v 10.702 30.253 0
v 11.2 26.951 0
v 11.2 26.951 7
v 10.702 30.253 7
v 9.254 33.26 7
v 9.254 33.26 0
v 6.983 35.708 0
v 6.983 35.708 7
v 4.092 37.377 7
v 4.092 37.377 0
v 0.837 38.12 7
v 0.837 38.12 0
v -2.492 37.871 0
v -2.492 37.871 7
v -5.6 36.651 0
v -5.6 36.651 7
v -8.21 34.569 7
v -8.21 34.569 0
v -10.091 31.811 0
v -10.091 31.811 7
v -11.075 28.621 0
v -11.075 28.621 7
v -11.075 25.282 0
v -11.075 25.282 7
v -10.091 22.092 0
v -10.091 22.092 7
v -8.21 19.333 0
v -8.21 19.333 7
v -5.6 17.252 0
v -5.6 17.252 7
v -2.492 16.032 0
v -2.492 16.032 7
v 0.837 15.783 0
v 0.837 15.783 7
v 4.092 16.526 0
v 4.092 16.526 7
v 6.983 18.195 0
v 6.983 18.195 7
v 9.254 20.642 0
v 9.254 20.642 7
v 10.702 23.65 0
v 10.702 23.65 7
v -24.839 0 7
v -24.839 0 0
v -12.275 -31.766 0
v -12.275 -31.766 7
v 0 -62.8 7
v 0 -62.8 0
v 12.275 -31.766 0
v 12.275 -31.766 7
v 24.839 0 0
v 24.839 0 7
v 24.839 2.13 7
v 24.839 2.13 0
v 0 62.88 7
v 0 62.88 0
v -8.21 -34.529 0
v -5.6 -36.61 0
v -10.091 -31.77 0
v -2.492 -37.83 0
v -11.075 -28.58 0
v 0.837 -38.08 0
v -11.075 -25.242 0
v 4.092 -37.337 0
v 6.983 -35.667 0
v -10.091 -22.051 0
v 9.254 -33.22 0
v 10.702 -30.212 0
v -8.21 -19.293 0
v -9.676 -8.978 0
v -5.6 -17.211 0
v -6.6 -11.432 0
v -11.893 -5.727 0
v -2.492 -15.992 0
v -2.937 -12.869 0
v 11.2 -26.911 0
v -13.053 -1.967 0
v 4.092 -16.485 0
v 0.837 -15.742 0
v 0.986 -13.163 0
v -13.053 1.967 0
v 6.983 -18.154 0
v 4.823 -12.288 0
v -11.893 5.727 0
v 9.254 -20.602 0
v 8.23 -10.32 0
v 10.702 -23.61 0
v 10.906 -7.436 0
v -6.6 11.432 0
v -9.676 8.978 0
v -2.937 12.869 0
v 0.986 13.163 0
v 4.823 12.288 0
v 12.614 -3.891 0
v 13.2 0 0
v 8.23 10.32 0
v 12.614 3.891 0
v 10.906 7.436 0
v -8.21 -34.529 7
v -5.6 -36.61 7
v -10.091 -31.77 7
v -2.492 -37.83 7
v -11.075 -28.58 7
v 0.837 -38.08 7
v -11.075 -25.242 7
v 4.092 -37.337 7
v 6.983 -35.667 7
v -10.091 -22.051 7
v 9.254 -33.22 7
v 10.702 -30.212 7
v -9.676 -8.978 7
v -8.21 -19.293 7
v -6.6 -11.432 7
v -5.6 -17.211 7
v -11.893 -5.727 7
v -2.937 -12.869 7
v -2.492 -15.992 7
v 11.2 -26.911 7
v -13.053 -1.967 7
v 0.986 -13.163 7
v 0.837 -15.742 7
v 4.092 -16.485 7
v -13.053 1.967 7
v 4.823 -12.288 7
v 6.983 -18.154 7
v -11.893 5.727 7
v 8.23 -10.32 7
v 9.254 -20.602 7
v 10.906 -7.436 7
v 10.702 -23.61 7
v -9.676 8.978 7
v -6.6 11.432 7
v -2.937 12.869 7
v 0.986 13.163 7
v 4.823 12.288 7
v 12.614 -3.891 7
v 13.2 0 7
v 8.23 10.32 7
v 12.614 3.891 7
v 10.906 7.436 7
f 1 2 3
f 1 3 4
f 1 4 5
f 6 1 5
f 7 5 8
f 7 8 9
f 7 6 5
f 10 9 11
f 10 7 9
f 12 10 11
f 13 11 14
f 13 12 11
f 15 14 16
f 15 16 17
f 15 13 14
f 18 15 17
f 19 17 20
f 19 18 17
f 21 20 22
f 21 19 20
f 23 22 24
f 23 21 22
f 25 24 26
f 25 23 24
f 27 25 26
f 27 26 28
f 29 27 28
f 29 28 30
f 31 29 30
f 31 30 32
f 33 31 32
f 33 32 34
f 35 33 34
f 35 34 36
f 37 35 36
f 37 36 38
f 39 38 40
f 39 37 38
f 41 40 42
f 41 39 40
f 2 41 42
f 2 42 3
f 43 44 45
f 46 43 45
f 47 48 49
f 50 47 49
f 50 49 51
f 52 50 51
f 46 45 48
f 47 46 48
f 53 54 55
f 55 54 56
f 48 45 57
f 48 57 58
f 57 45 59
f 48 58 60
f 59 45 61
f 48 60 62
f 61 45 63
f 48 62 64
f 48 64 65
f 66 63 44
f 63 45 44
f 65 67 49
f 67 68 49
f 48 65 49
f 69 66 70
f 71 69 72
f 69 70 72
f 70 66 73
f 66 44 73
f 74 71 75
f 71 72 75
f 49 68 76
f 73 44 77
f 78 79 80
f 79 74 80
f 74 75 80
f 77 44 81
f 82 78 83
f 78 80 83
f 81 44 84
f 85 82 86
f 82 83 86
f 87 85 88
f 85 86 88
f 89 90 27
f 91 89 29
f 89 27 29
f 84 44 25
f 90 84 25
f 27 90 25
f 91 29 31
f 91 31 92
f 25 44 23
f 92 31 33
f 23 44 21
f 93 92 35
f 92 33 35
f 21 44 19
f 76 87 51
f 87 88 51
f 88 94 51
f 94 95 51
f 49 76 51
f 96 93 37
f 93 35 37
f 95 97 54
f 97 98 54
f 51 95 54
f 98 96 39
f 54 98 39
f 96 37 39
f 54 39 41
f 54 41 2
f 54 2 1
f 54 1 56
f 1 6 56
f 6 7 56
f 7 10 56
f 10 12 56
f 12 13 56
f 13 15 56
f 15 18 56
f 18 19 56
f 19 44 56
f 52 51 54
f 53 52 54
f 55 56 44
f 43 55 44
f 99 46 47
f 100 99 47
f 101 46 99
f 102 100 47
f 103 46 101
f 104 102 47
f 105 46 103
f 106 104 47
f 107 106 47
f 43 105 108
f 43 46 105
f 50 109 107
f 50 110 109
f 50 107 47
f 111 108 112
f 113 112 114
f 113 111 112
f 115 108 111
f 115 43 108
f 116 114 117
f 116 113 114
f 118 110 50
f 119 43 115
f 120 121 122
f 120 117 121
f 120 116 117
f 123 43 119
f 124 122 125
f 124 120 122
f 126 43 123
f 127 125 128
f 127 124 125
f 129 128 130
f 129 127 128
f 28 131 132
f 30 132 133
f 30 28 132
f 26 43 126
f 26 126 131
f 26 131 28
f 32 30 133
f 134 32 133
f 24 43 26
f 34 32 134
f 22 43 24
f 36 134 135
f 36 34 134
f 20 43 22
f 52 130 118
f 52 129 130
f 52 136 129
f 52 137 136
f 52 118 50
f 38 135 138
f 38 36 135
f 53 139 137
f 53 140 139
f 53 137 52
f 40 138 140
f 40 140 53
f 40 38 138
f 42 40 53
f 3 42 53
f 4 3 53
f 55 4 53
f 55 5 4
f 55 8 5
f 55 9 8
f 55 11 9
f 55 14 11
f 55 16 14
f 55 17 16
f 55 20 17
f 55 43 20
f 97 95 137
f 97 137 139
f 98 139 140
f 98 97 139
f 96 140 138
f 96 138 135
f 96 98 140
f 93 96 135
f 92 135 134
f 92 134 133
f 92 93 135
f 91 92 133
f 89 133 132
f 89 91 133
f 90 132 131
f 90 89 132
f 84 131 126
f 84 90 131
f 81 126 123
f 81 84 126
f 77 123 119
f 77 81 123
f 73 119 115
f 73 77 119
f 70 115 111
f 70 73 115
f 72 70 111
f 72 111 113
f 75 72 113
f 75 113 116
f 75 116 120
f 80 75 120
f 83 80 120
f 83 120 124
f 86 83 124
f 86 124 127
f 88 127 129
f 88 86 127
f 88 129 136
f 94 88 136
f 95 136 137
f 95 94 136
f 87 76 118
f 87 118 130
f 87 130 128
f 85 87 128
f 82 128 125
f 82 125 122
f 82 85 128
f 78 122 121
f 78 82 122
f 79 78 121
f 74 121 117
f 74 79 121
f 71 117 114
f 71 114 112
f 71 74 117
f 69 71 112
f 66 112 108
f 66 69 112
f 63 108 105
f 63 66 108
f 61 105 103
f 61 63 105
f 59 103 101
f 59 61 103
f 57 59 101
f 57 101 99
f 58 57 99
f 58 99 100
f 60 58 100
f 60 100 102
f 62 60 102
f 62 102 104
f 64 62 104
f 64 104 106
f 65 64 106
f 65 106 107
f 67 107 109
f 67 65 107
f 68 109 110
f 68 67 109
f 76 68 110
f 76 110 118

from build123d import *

# Parameters (mm, degrees)
F0_R     = 13.2
F0_R_2   = 11.2
F1_DEPTH = 7


with BuildPart() as f1:
    # F0 (on Top) → F1 (new body)
    with BuildSketch(Plane.XY):
        with BuildLine():
            Line((0, 62.8797411919), (-12.2768469832, 31.8009569457))
            Line((-12.2768469832, 31.8009569457), (-24.8389690807, 0))
            Line((-24.8389690807, 0), (-12.2747386314, -31.7658919264))
            ThreePointArc((-12.2747386314, -31.7658919264), (-2.4711788751, -13.9442943997), (13.2, -26.9109159708))
            ThreePointArc((13.2, -26.9109159708), (12.9666215525, -29.3820949435), (12.2747385583, -31.7658921113))
            Line((12.2747385583, -31.7658921113), (24.8389690807, 0))
            Line((24.8389690807, 0), (24.8389690807, 2.1297414787))
            Line((24.8389690807, 2.1297414787), (0, 62.8797411919))
        make_face()
        Circle(F0_R, mode=Mode.SUBTRACT)
        with BuildLine():
            ThreePointArc((-12.2768469832, 31.8009569457), (2.4683617869, 39.9184730161), (13.2, 26.9513148814))
            ThreePointArc((13.2, 26.9513148814), (-2.4683617869, 13.9841567468), (-12.2768469832, 31.8009569457))
        make_face(mode=Mode.SUBTRACT)
        with BuildLine():
            ThreePointArc((-12.2768469832, 31.8009569457), (-2.4683617869, 13.9841567468), (13.2, 26.9513148814))
            ThreePointArc((13.2, 26.9513148814), (2.4683617869, 39.9184730161), (-12.2768469832, 31.8009569457))
        make_face()
        with Locations((0, 26.9513148814)):
            Circle(F0_R_2, mode=Mode.SUBTRACT)
        with BuildLine():
            ThreePointArc((13.2, -26.9109159708), (-2.4711788751, -13.9442943997), (-12.2747386314, -31.7658919264))
            ThreePointArc((-12.2747386314, -31.7658919264), (-9.94e-08, -40.1109159708), (12.2747385583, -31.7658921113))
            ThreePointArc((12.2747385583, -31.7658921113), (12.9666215525, -29.3820949435), (13.2, -26.9109159708))
        make_face()
        with Locations((0, -26.9109159708)):
            Circle(F0_R_2, mode=Mode.SUBTRACT)
        with BuildLine():
            ThreePointArc((12.2747385583, -31.7658921113), (-9.94e-08, -40.1109159708), (-12.2747386314, -31.7658919264))
            Line((-12.2747386314, -31.7658919264), (0, -62.7998674944))
            Line((0, -62.7998674944), (12.2747385583, -31.7658921113))
        make_face()
    extrude(amount=F1_DEPTH)


solid = f1.part
